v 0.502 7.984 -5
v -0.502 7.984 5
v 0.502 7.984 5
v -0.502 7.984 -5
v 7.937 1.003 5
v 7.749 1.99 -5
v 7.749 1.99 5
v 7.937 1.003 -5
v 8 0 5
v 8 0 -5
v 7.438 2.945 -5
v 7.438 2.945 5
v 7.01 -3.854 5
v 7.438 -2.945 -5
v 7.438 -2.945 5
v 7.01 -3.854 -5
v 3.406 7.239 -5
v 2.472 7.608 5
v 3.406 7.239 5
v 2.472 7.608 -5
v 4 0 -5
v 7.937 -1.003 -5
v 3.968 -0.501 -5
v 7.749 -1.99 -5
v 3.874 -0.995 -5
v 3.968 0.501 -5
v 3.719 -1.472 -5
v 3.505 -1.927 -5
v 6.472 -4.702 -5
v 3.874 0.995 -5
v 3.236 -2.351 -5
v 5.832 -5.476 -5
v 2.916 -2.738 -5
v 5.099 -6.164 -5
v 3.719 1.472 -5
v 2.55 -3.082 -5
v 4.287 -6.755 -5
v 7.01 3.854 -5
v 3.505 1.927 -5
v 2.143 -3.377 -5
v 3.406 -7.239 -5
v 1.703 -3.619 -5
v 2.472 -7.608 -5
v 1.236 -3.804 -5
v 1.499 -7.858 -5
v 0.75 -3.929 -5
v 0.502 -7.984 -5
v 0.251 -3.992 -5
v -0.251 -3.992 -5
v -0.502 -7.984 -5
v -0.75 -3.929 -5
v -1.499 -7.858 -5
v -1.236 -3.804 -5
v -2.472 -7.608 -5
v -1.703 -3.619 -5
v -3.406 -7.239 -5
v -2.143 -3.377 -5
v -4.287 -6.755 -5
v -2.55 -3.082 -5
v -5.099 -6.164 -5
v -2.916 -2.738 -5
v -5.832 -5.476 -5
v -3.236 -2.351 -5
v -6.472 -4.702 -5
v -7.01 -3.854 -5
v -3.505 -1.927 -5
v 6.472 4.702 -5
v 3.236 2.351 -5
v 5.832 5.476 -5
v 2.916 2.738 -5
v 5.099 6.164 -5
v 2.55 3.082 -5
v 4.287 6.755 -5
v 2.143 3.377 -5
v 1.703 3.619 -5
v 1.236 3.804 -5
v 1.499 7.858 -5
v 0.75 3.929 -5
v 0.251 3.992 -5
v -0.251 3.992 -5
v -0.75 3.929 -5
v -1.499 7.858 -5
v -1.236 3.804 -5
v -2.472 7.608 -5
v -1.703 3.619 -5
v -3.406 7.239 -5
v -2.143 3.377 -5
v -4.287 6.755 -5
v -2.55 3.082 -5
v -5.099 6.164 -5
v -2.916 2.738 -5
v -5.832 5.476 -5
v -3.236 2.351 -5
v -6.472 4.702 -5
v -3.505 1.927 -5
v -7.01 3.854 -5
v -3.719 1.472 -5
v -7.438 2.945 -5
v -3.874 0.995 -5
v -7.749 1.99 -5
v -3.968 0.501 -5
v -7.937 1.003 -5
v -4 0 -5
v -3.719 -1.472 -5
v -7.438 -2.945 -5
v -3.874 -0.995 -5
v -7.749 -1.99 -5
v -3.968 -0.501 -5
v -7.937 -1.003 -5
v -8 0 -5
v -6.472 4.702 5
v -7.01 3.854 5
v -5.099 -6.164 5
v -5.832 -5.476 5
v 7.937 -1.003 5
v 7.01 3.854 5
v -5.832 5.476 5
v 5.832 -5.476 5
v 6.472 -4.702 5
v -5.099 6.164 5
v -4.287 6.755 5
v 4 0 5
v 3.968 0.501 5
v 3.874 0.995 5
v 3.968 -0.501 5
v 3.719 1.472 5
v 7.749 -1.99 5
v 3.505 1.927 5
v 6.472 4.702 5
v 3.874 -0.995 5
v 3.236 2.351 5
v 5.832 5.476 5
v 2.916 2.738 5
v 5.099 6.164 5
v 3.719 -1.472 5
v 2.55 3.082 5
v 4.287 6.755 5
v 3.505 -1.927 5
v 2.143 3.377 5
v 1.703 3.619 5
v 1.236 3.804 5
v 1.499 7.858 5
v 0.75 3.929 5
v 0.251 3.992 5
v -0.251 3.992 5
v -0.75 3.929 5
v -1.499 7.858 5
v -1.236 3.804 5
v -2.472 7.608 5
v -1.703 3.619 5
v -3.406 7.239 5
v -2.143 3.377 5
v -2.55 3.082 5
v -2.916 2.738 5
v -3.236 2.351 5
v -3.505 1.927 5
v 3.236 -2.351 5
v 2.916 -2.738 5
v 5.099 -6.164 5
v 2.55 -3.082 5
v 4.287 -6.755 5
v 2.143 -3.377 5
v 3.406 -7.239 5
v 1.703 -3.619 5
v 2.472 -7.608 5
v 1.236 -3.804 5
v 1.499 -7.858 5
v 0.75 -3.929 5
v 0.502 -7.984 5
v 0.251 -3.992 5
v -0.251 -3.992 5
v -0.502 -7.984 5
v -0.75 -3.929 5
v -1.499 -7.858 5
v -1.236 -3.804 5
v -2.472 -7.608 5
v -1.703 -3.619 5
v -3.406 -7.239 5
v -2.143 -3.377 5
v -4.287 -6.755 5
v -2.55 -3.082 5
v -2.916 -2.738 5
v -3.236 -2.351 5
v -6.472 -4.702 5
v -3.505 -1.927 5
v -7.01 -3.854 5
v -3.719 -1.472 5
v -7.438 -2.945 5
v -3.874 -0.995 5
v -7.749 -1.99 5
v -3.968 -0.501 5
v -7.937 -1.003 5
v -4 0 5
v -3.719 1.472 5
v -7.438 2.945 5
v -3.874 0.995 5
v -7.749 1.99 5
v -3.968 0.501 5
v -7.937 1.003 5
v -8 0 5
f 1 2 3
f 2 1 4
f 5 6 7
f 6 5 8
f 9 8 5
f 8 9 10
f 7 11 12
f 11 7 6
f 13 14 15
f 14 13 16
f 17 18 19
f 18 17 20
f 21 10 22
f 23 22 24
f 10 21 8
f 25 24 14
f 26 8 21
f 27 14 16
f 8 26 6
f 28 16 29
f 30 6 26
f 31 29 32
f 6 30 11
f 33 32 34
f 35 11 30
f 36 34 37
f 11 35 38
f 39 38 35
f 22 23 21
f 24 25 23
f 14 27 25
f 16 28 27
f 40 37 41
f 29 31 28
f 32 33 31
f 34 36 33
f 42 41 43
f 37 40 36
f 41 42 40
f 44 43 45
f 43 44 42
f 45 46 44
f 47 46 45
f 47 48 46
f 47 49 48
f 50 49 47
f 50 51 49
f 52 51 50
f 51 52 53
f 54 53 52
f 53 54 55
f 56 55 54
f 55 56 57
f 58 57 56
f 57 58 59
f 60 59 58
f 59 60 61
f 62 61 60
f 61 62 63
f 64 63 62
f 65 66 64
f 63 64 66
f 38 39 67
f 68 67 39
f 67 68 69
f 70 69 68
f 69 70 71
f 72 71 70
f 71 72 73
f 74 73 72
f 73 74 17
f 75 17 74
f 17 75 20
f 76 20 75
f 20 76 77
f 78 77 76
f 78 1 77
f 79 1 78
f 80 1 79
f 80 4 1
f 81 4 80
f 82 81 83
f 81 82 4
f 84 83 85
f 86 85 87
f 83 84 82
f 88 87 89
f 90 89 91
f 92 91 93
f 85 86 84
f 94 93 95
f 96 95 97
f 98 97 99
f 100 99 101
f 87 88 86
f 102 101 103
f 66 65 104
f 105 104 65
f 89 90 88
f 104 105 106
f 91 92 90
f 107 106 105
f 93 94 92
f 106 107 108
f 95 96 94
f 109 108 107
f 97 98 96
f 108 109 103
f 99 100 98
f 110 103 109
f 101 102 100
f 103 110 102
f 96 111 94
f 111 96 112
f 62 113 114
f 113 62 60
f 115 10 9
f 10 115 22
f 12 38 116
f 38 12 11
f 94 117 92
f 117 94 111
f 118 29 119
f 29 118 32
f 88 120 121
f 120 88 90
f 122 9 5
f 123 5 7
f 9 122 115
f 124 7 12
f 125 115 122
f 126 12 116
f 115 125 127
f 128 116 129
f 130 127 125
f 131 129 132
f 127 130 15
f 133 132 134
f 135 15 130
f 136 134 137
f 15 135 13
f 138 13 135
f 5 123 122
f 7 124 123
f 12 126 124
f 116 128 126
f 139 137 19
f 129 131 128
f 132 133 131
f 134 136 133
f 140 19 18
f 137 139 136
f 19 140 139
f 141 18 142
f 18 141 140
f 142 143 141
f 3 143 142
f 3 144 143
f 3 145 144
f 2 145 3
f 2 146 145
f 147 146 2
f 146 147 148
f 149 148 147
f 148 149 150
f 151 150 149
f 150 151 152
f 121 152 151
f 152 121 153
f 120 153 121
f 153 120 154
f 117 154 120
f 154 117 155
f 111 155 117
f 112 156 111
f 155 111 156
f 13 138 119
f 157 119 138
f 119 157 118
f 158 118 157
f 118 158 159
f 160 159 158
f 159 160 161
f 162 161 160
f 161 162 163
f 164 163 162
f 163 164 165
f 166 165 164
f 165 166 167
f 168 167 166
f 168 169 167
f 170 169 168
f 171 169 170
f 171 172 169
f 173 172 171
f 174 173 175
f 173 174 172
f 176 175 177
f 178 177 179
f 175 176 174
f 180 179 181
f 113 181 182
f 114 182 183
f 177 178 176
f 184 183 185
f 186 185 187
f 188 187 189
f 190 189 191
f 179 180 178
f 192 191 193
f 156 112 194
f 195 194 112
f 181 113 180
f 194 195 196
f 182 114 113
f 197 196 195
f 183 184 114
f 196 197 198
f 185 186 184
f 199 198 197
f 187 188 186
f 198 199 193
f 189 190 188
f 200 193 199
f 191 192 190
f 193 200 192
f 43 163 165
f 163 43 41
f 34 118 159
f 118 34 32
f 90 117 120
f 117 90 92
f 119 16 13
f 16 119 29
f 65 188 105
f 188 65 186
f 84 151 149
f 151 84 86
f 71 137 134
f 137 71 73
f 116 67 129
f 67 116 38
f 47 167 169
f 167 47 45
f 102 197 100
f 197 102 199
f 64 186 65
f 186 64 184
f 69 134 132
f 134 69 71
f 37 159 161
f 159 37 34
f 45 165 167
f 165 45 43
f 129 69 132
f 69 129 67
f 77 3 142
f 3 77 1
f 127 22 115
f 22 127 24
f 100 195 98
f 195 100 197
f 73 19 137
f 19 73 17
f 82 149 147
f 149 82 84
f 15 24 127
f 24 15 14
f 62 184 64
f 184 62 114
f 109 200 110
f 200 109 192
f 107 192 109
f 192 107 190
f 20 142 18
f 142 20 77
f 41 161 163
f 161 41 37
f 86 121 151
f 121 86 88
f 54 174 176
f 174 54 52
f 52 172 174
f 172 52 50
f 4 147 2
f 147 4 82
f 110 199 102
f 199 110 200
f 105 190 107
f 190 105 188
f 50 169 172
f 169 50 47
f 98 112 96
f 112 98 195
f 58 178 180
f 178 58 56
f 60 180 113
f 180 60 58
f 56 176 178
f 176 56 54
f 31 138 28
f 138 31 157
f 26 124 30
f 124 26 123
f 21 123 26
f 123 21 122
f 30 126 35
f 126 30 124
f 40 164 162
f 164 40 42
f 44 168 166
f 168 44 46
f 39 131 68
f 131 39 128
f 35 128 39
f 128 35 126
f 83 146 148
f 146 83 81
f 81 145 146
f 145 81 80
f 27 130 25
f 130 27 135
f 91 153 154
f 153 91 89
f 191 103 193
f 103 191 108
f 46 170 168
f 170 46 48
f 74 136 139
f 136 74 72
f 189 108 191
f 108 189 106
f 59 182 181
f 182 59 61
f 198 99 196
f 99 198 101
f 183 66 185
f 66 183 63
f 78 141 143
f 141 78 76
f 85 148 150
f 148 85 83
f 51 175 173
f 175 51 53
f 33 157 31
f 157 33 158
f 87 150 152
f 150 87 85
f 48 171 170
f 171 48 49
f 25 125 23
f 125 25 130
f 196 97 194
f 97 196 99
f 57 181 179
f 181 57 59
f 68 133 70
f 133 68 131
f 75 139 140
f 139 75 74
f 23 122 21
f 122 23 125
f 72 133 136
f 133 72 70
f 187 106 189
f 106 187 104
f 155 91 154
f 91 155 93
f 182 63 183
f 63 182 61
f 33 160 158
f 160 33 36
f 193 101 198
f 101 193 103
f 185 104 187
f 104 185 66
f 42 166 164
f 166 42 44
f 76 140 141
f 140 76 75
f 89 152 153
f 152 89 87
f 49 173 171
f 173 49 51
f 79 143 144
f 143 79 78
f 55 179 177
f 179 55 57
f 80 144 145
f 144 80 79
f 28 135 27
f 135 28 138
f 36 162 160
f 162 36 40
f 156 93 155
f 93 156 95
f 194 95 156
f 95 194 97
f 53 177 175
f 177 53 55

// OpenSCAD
$fn = 50;


difference() {
	union() {
		translate(v = [0, 0, -5.0000000000]) {
			cylinder(h = 10, r = 8.0000000000);
		}
	}
	union() {
		translate(v = [0, 0, -100.0000000000]) {
			cylinder(h = 200, r = 4.0000000000);
		}
	}
}
